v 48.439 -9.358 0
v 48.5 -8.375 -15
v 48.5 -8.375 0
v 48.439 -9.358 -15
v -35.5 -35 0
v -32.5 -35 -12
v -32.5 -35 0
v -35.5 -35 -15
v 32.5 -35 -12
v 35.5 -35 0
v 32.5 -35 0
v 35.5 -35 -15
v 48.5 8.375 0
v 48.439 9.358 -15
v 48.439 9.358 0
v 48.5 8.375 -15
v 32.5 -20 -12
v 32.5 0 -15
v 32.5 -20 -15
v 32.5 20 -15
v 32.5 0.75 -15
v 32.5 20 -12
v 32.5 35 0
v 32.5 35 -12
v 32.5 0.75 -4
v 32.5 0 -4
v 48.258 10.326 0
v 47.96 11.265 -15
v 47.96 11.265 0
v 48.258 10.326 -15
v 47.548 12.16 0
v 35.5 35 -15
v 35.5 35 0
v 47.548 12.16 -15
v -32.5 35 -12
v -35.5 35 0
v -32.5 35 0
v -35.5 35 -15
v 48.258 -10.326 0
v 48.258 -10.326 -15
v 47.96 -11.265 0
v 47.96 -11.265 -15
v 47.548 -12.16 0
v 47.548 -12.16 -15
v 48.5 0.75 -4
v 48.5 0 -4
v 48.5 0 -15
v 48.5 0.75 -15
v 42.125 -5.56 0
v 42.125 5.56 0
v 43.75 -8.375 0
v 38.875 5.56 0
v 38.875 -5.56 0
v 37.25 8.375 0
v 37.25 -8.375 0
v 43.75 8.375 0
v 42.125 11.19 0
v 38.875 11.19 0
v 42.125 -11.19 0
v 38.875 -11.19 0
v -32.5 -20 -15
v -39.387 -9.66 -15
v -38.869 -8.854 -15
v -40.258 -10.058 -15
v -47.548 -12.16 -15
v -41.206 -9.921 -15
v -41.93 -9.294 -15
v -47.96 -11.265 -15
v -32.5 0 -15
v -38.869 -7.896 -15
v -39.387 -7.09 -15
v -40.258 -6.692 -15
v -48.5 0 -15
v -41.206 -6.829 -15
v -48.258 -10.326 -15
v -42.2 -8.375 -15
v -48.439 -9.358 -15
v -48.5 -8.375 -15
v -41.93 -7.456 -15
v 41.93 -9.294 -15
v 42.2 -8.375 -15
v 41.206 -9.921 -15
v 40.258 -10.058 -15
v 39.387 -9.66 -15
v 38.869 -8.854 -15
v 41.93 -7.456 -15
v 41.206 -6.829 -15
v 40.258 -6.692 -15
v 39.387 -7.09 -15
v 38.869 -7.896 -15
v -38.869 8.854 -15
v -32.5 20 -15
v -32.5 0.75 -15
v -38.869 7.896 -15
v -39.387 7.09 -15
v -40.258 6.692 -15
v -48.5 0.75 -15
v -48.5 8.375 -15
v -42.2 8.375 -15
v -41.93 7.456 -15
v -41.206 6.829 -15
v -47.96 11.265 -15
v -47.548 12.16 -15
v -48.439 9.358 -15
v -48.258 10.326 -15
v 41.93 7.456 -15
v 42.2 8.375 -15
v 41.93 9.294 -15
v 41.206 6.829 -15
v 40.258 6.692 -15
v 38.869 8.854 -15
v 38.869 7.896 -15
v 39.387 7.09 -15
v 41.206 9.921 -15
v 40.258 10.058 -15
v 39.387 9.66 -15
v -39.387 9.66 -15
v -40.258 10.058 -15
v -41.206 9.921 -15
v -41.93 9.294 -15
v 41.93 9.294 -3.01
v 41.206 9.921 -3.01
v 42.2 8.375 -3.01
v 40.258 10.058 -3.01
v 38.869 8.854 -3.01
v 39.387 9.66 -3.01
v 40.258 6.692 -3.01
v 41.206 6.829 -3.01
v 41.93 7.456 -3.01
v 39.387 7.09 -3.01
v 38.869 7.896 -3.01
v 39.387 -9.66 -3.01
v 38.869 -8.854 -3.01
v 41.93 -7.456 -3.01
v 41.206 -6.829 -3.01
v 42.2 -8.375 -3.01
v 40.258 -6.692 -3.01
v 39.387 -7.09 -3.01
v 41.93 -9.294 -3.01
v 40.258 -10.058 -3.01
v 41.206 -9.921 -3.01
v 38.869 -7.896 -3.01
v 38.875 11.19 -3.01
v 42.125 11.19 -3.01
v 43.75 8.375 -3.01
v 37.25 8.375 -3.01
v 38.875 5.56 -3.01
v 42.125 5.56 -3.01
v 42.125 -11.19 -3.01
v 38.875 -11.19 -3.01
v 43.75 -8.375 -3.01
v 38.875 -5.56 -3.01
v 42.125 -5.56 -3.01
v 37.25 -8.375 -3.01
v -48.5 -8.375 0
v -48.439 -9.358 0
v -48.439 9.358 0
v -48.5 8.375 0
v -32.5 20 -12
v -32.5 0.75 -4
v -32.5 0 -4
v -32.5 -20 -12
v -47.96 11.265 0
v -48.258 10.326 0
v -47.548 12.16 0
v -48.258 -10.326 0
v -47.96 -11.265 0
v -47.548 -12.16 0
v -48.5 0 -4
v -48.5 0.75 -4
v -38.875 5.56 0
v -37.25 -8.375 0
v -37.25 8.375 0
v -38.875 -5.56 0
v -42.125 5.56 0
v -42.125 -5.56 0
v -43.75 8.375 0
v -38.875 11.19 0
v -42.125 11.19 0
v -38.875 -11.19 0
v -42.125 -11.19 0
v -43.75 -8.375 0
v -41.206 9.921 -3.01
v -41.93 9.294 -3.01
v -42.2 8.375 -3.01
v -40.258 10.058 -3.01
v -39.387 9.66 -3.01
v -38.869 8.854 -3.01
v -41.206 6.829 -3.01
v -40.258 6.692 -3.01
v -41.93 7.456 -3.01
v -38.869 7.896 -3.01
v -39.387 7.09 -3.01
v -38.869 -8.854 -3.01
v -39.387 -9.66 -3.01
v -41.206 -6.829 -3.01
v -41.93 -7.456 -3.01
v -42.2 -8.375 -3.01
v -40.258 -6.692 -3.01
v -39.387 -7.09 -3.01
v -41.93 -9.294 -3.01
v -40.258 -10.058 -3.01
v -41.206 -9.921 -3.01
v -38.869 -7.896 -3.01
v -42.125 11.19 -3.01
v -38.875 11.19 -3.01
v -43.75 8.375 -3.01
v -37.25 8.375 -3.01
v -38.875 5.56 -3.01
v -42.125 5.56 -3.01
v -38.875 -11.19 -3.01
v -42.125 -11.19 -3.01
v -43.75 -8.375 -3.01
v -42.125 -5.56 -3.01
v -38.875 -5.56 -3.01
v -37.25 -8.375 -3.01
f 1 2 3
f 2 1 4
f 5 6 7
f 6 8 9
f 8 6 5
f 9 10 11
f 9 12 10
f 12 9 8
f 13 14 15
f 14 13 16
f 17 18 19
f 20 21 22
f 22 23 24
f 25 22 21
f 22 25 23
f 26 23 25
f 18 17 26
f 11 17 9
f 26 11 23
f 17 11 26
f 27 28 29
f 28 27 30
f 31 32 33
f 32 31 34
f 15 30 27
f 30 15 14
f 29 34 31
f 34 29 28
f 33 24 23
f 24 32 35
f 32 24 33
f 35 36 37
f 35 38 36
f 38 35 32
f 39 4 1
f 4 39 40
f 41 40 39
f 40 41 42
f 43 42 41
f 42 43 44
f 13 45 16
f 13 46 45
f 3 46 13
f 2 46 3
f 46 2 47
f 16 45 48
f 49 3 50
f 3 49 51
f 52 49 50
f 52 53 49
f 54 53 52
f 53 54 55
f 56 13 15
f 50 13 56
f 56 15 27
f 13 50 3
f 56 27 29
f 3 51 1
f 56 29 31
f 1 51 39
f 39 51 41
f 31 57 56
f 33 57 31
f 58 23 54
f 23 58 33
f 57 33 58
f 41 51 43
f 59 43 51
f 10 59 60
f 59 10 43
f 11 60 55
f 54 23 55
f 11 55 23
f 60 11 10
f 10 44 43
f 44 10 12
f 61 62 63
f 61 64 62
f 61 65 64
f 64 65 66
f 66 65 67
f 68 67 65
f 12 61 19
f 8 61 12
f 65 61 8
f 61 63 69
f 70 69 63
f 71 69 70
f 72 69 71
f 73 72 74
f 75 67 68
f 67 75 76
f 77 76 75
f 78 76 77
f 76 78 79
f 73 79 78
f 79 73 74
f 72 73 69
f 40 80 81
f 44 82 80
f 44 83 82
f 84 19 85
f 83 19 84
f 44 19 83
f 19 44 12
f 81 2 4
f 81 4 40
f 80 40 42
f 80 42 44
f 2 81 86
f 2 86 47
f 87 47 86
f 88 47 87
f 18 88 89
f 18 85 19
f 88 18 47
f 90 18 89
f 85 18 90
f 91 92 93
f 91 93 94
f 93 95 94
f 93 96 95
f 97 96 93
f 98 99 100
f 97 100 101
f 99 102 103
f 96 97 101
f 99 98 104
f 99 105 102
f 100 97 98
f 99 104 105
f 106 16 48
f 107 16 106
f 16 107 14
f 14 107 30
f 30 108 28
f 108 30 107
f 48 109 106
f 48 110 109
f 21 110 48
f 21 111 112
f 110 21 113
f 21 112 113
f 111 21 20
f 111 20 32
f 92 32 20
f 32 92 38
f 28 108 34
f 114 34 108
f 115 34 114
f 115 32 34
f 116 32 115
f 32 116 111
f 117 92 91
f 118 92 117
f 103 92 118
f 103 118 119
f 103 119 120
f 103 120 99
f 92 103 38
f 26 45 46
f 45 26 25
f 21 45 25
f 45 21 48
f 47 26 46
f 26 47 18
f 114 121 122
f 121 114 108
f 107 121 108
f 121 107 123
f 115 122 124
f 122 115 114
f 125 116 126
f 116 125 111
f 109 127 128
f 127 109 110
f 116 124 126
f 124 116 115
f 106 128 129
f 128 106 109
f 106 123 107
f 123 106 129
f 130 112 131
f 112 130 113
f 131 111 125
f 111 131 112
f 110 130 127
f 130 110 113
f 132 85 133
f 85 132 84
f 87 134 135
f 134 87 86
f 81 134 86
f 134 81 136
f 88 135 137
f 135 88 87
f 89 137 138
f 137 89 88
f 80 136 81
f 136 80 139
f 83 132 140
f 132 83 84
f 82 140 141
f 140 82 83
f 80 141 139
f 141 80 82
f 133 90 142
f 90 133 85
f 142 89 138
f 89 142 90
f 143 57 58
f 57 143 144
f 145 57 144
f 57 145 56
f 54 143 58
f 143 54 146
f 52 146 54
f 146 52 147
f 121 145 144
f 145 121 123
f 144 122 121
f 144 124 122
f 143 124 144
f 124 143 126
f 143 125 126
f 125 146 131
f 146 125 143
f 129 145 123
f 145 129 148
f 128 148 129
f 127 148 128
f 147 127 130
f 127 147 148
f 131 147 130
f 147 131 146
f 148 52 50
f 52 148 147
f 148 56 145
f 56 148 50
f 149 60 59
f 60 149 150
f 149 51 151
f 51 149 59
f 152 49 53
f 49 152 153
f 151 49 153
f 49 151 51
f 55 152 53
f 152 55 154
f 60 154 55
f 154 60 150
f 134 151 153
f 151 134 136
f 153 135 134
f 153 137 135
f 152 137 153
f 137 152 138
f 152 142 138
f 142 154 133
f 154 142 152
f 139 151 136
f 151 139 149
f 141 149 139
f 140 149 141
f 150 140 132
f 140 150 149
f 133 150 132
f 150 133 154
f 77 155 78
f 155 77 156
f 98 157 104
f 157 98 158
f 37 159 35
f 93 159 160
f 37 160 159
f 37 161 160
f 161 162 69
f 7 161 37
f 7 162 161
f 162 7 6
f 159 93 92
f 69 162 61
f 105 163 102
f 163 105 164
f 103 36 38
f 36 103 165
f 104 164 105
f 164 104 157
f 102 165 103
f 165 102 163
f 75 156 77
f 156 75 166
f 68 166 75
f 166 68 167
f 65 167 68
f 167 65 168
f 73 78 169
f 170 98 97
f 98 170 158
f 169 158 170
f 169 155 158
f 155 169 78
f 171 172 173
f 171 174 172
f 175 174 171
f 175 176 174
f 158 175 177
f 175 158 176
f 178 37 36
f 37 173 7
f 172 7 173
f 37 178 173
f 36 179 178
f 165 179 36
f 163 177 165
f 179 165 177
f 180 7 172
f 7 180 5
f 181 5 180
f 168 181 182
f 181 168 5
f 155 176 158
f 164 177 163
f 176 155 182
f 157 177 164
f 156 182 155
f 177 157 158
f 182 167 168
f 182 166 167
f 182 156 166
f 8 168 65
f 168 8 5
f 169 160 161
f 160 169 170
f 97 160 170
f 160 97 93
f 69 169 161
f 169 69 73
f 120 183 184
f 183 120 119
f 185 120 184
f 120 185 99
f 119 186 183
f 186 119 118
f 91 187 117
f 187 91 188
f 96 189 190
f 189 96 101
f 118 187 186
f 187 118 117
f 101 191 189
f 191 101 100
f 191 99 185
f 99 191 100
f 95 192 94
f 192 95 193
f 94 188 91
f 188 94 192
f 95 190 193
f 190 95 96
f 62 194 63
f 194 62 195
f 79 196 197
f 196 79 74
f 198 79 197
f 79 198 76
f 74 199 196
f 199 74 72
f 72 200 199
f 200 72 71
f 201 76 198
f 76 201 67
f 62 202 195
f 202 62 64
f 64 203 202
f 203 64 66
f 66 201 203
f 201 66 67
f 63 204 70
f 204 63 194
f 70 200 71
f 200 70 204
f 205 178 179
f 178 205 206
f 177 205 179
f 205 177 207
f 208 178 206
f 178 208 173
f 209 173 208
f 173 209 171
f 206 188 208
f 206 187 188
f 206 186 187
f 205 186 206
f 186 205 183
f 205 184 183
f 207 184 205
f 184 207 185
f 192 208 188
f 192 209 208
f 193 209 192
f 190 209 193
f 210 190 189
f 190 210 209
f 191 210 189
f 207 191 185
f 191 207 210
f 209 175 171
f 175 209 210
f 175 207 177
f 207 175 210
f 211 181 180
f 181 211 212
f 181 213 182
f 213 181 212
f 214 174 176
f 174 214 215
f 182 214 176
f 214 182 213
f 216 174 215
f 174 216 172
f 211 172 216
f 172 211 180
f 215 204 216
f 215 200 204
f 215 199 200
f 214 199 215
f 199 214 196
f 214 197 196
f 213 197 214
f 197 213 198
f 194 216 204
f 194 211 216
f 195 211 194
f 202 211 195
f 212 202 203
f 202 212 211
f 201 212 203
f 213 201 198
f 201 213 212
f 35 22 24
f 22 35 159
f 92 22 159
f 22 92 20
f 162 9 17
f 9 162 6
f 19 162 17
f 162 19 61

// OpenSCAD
bsl=1/100;
$fs=1/1;
$fa=1/1;

part="miter";//[miter,stab,spacers,shim,NOSTL_all]

//miter box parameters
length=70;
width=65;
height=12;
depth=8; //max cut depth above shim
cut=0.75; //cut width
wall=3; //thickness of horizontal and vertical walls
rest=15; //width of feature that rests against fretboard/frets

//experimental feature, ended up not using
elongated=false;
add_length=35;

//bearing parameters
od=16; //outer diameter
id=5; //inner diameter
bh=5; //height
step=1; //step that holds bearing on axis

//saw geometry
clearance_bot=10; //ball bearing from saw teeth
clearance_top=15; //ball bearing from saw ridge
saw_blade=62;

//screw and nut parameters
screw=3.4;
insert_h=3;
insert_w=6.5;
insert_hex=true;

//shim for consistent height, with cutout for existing fret
fret_height=2;
fret_width=3;
fret_radius=12*25.4;
slack=0.1;

bearing_p1=height+clearance_bot;
bearing_p2=height-depth+saw_blade-clearance_top-bh;
ox=width/2+od/2;
oy=od/2+cut/2;
tr=[[ox,oy],[ox,-oy],[-ox,-oy],[-ox,oy],[ox,oy]];
spacers_h=[bearing_p1-height-wall,
           bearing_p2-bearing_p1-bh,
           height+wall+saw_blade-bearing_p2-bh];
spacers_b=[true,true,false];

module half(add=false) {
  difference() {
    hull() {
      translate([width/2,-length/2]) cube([wall,length,height+wall]);
      translate([ox,oy,0])cylinder(d=od,h=height+wall);
      translate([ox,-oy,0])cylinder(d=od,h=height+wall);
    }
    translate([0,0,height-depth]) cube([width+2*od,cut,depth+wall]);
    translate([ox,oy,-bsl])cylinder(d=screw,h=height+wall+2*bsl);
    translate([ox,-oy,-bsl])cylinder(d=screw,h=height+wall+2*bsl);
    translate([ox,oy,-bsl])cylinder(d=insert_w,h=insert_h+2*bsl,$fn=insert_hex?6:16);
    translate([ox,-oy,-bsl])cylinder(d=insert_w,h=insert_h+2*bsl,$fn=insert_hex?6:16);
  }
  if(add) translate([width/2,length/2]) cube([wall,add_length,height+wall]);
}

module stab() {
  for (i=[0:1:3]) difference() {
    hull() {
      translate(tr[i]) cylinder(d=od+id,h=wall);
      translate(tr[i+1]) cylinder(d=(od+id)/2,h=wall);
    }
    translate([0,0,-bsl]) translate(tr[i]) cylinder(h=wall+2*bsl,d=screw);
    translate([0,0,-bsl]) translate(tr[i+1]) cylinder(h=wall+2*bsl,d=screw);
  }
}

module spacer(h,bearing=true) {
  difference() {
    union() {
      if(bearing) cylinder(h=h+bh,d=id);
      cylinder(h=h,d=id+2*step);
    }
    translate([0,0,-bsl]) cylinder(d=screw,h=h+bh+2*bsl);
  }
}

module miter_box(add=false) {
  for (m=[[0,0,0],[1,0,0]]) mirror(m) half(add);
  translate([-width/2,length/2-rest,height]) cube([width,rest,wall]);
  translate([-width/2,-length/2,height]) cube([width,rest,wall]);
  if (add) translate([-width/2,length/2+add_length-rest,height]) cube([width,rest,wall]);
}

module shim() {
  difference() {
    translate([-width/2+slack,-rest/2,0]) cube([width-2*slack,rest,10]);
    translate([0,0,fret_radius+fret_height])rotate([90,0,0]) cylinder(h=rest+bsl,r=fret_radius,center=true);
    translate([0,0,fret_radius+fret_height])rotate([90,0,0]) cylinder(h=fret_width,r=fret_radius+fret_height,center=true);
  }
}

if (part=="NOSTL_all") {
  miter_box(elongated);
  translate([0,0,height+wall+saw_blade]) stab();
  for (pos=tr) translate([pos[0],pos[1],bearing_p1]) cylinder(d=od,h=bh);
  for (pos=tr) translate([pos[0],pos[1],bearing_p2]) cylinder(d=od,h=bh);
  for (pos=tr) translate([pos[0],pos[1],height+wall]) spacer(bearing_p1-height-wall);
  for (pos=tr) translate([pos[0],pos[1],bearing_p1+bh]) spacer(bearing_p2-bearing_p1-bh);
  for (pos=tr) translate([pos[0],pos[1],bearing_p2+bh]) spacer(height+wall+saw_blade-bearing_p2-bh,false);
}
if (part=="miter") mirror([0,0,1]) miter_box(elongated);
if (part=="stab") stab();
if (part=="spacers") for (i=[0:1:2]) for (j=[0:1:3]) translate(od*[i,j]) spacer(spacers_h[i],spacers_b[i]);
if (part=="shim") shim();
